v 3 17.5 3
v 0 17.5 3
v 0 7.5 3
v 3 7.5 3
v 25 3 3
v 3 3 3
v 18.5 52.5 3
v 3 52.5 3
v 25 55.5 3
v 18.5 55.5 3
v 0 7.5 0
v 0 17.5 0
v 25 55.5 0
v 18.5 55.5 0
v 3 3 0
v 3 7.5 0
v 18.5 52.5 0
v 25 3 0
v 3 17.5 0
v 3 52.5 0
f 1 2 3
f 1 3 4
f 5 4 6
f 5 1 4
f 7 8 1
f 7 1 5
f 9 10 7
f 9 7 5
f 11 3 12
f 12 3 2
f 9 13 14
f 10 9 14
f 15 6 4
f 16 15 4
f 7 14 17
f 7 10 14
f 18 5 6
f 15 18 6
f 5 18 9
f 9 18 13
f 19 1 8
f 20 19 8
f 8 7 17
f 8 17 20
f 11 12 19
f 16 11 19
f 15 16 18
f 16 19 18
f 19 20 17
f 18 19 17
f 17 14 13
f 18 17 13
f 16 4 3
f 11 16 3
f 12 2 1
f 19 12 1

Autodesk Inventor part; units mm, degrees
ref_plane "YZ Plane" through (0, 0, 0) normal (1, 0, 0) x (0, 1, 0)
ref_plane "XZ Plane" through (0, 0, 0) normal (0, 1, 0) x (-1, 0, 0)
ref_plane "XY Plane" through (0, 0, 0) normal (0, 0, 1) x (1, 0, 0)
sketch "Sketch1" plane through (0, 0, 0) normal (0, 0, 1) x (1, 0, 0)
  line L0 (0, 0) -> (25, 0)
  line L1 (25, 0) -> (25, 55.5)
  line L2 (25, 55.5) -> (0, 55.5)
  line L3 (0, 55.5) -> (0, 0)
  dimension "d0" = 25
  dimension "d1" = 55.5
extrude "Extrusion1" add sketch "Sketch1" along normal blind 3
sketch "Sketch2" plane through (0, 0, 3) normal (0, 0, 1) x (1, 0, 0)
  line L0 (0, 55.5) -> (0, 0) projected
  line L1 (25, 55.5) -> (0, 55.5) projected
  line L2 (0, 0) -> (3, 0)
  line L3 (3, 0) -> (3, 55.5)
  line L4 (3, 55.5) -> (0, 55.5)
  line L5 (0, 55.5) -> (0, 0)
  dimension "d4" = 3
extrude "Extrusion2" cut sketch "Sketch2" against normal through all
sketch "Sketch3" plane through (0, 0, 3) normal (0, 0, 1) x (1, 0, 0)
  point P0 (0, 0)
sketch "Sketch4" plane through (0, 0, 3) normal (0, 0, 1) x (1, 0, 0)
  line L0 (25, 55.5) -> (3, 55.5) projected
  line L1 (3, 55.5) -> (18.5, 55.5)
  line L2 (18.5, 55.5) -> (18.5, 22.5)
  line L3 (18.5, 22.5) -> (3, 22.5)
  line L4 (3, 22.5) -> (3, 55.5)
  point P0 (0, 0)
  dimension "d7" = 15.5
  dimension "d8" = 33
sketch "Sketch5" plane through (0, 0, 3) normal (0, 0, 1) x (1, 0, 0)
  line L0 (3, 0) -> (25, 0) projected
  line L1 (8, 0) -> (18, 0)
  line L2 (18, 0) -> (18, 3)
  line L3 (18, 3) -> (8, 3)
  line L4 (8, 3) -> (8, 0)
  line L5 (3, 55.5) -> (3, 0) projected
  line L6 (3, 0) -> (8, 0)
  line L7 (8, 0) -> (8, 3)
  line L8 (8, 3) -> (3, 3)
  line L9 (3, 3) -> (3, 0)
  line L10 (18, 0) -> (25, 0)
  line L11 (25, 0) -> (25, 3)
  line L12 (25, 3) -> (18, 3)
  line L13 (18, 3) -> (18, 0)
  point P0 (0, 0)
  point P1 (3, 22.5)
  dimension "d11" = 10
  dimension "d12" = 3
  dimension "d13" = 5
extrude "Extrusion4" cut sketch "Sketch5" against normal through all contours L5 L8 L4 L0 | L2 L12 L11 L0
sketch "Sketch6" plane through (0, 0, 3) normal (0, 0, 1) x (1, 0, 0)
  line L0 (25, 55.5) -> (3, 55.5) projected
  line L1 (3, 55.5) -> (18.5, 55.5)
  line L2 (18.5, 55.5) -> (18.5, 52.5)
  line L3 (18.5, 52.5) -> (3, 52.5)
  line L4 (3, 52.5) -> (3, 55.5)
  line L5 (18.5, 55.5) -> (18.5, 22.5) projected
  point P0 (0, 0)
  dimension "d16" = 3
extrude "Extrusion5" cut sketch "Sketch6" against normal through all
sketch "Sketch7" plane through (0, 0, 3) normal (0, 0, 1) x (1, 0, 0)
  line L0 (8, 0) -> (8, 3) projected
  line L1 (25, 3) -> (18, 3) projected
  line L2 (8, 0) -> (18, 0)
  line L3 (18, 0) -> (18, 3)
  line L4 (18, 3) -> (8, 3)
  line L5 (8, 3) -> (8, 0)
  point P0 (0, 0)
extrude "Extrusion6" cut sketch "Sketch7" against normal through all
sketch "Sketch8" plane through (0, 0, 3) normal (0, 0, 1) x (1, 0, 0)
  line L0 (3, 3) -> (3, 52.5) projected
  line L1 (3, 7.5) -> (0, 7.5)
  line L2 (0, 7.5) -> (0, 17.5)
  line L3 (0, 17.5) -> (3, 17.5)
  line L4 (3, 17.5) -> (3, 7.5)
  line L5 (3, 3) -> (25, 3) projected
  point P0 (0, 0)
  dimension "d21" = 3
  dimension "d22" = 10
  dimension "d23" = 4.5
extrude "Extrusion7" add sketch "Sketch8" against normal blind 3
properties part number "hollow_mount"
